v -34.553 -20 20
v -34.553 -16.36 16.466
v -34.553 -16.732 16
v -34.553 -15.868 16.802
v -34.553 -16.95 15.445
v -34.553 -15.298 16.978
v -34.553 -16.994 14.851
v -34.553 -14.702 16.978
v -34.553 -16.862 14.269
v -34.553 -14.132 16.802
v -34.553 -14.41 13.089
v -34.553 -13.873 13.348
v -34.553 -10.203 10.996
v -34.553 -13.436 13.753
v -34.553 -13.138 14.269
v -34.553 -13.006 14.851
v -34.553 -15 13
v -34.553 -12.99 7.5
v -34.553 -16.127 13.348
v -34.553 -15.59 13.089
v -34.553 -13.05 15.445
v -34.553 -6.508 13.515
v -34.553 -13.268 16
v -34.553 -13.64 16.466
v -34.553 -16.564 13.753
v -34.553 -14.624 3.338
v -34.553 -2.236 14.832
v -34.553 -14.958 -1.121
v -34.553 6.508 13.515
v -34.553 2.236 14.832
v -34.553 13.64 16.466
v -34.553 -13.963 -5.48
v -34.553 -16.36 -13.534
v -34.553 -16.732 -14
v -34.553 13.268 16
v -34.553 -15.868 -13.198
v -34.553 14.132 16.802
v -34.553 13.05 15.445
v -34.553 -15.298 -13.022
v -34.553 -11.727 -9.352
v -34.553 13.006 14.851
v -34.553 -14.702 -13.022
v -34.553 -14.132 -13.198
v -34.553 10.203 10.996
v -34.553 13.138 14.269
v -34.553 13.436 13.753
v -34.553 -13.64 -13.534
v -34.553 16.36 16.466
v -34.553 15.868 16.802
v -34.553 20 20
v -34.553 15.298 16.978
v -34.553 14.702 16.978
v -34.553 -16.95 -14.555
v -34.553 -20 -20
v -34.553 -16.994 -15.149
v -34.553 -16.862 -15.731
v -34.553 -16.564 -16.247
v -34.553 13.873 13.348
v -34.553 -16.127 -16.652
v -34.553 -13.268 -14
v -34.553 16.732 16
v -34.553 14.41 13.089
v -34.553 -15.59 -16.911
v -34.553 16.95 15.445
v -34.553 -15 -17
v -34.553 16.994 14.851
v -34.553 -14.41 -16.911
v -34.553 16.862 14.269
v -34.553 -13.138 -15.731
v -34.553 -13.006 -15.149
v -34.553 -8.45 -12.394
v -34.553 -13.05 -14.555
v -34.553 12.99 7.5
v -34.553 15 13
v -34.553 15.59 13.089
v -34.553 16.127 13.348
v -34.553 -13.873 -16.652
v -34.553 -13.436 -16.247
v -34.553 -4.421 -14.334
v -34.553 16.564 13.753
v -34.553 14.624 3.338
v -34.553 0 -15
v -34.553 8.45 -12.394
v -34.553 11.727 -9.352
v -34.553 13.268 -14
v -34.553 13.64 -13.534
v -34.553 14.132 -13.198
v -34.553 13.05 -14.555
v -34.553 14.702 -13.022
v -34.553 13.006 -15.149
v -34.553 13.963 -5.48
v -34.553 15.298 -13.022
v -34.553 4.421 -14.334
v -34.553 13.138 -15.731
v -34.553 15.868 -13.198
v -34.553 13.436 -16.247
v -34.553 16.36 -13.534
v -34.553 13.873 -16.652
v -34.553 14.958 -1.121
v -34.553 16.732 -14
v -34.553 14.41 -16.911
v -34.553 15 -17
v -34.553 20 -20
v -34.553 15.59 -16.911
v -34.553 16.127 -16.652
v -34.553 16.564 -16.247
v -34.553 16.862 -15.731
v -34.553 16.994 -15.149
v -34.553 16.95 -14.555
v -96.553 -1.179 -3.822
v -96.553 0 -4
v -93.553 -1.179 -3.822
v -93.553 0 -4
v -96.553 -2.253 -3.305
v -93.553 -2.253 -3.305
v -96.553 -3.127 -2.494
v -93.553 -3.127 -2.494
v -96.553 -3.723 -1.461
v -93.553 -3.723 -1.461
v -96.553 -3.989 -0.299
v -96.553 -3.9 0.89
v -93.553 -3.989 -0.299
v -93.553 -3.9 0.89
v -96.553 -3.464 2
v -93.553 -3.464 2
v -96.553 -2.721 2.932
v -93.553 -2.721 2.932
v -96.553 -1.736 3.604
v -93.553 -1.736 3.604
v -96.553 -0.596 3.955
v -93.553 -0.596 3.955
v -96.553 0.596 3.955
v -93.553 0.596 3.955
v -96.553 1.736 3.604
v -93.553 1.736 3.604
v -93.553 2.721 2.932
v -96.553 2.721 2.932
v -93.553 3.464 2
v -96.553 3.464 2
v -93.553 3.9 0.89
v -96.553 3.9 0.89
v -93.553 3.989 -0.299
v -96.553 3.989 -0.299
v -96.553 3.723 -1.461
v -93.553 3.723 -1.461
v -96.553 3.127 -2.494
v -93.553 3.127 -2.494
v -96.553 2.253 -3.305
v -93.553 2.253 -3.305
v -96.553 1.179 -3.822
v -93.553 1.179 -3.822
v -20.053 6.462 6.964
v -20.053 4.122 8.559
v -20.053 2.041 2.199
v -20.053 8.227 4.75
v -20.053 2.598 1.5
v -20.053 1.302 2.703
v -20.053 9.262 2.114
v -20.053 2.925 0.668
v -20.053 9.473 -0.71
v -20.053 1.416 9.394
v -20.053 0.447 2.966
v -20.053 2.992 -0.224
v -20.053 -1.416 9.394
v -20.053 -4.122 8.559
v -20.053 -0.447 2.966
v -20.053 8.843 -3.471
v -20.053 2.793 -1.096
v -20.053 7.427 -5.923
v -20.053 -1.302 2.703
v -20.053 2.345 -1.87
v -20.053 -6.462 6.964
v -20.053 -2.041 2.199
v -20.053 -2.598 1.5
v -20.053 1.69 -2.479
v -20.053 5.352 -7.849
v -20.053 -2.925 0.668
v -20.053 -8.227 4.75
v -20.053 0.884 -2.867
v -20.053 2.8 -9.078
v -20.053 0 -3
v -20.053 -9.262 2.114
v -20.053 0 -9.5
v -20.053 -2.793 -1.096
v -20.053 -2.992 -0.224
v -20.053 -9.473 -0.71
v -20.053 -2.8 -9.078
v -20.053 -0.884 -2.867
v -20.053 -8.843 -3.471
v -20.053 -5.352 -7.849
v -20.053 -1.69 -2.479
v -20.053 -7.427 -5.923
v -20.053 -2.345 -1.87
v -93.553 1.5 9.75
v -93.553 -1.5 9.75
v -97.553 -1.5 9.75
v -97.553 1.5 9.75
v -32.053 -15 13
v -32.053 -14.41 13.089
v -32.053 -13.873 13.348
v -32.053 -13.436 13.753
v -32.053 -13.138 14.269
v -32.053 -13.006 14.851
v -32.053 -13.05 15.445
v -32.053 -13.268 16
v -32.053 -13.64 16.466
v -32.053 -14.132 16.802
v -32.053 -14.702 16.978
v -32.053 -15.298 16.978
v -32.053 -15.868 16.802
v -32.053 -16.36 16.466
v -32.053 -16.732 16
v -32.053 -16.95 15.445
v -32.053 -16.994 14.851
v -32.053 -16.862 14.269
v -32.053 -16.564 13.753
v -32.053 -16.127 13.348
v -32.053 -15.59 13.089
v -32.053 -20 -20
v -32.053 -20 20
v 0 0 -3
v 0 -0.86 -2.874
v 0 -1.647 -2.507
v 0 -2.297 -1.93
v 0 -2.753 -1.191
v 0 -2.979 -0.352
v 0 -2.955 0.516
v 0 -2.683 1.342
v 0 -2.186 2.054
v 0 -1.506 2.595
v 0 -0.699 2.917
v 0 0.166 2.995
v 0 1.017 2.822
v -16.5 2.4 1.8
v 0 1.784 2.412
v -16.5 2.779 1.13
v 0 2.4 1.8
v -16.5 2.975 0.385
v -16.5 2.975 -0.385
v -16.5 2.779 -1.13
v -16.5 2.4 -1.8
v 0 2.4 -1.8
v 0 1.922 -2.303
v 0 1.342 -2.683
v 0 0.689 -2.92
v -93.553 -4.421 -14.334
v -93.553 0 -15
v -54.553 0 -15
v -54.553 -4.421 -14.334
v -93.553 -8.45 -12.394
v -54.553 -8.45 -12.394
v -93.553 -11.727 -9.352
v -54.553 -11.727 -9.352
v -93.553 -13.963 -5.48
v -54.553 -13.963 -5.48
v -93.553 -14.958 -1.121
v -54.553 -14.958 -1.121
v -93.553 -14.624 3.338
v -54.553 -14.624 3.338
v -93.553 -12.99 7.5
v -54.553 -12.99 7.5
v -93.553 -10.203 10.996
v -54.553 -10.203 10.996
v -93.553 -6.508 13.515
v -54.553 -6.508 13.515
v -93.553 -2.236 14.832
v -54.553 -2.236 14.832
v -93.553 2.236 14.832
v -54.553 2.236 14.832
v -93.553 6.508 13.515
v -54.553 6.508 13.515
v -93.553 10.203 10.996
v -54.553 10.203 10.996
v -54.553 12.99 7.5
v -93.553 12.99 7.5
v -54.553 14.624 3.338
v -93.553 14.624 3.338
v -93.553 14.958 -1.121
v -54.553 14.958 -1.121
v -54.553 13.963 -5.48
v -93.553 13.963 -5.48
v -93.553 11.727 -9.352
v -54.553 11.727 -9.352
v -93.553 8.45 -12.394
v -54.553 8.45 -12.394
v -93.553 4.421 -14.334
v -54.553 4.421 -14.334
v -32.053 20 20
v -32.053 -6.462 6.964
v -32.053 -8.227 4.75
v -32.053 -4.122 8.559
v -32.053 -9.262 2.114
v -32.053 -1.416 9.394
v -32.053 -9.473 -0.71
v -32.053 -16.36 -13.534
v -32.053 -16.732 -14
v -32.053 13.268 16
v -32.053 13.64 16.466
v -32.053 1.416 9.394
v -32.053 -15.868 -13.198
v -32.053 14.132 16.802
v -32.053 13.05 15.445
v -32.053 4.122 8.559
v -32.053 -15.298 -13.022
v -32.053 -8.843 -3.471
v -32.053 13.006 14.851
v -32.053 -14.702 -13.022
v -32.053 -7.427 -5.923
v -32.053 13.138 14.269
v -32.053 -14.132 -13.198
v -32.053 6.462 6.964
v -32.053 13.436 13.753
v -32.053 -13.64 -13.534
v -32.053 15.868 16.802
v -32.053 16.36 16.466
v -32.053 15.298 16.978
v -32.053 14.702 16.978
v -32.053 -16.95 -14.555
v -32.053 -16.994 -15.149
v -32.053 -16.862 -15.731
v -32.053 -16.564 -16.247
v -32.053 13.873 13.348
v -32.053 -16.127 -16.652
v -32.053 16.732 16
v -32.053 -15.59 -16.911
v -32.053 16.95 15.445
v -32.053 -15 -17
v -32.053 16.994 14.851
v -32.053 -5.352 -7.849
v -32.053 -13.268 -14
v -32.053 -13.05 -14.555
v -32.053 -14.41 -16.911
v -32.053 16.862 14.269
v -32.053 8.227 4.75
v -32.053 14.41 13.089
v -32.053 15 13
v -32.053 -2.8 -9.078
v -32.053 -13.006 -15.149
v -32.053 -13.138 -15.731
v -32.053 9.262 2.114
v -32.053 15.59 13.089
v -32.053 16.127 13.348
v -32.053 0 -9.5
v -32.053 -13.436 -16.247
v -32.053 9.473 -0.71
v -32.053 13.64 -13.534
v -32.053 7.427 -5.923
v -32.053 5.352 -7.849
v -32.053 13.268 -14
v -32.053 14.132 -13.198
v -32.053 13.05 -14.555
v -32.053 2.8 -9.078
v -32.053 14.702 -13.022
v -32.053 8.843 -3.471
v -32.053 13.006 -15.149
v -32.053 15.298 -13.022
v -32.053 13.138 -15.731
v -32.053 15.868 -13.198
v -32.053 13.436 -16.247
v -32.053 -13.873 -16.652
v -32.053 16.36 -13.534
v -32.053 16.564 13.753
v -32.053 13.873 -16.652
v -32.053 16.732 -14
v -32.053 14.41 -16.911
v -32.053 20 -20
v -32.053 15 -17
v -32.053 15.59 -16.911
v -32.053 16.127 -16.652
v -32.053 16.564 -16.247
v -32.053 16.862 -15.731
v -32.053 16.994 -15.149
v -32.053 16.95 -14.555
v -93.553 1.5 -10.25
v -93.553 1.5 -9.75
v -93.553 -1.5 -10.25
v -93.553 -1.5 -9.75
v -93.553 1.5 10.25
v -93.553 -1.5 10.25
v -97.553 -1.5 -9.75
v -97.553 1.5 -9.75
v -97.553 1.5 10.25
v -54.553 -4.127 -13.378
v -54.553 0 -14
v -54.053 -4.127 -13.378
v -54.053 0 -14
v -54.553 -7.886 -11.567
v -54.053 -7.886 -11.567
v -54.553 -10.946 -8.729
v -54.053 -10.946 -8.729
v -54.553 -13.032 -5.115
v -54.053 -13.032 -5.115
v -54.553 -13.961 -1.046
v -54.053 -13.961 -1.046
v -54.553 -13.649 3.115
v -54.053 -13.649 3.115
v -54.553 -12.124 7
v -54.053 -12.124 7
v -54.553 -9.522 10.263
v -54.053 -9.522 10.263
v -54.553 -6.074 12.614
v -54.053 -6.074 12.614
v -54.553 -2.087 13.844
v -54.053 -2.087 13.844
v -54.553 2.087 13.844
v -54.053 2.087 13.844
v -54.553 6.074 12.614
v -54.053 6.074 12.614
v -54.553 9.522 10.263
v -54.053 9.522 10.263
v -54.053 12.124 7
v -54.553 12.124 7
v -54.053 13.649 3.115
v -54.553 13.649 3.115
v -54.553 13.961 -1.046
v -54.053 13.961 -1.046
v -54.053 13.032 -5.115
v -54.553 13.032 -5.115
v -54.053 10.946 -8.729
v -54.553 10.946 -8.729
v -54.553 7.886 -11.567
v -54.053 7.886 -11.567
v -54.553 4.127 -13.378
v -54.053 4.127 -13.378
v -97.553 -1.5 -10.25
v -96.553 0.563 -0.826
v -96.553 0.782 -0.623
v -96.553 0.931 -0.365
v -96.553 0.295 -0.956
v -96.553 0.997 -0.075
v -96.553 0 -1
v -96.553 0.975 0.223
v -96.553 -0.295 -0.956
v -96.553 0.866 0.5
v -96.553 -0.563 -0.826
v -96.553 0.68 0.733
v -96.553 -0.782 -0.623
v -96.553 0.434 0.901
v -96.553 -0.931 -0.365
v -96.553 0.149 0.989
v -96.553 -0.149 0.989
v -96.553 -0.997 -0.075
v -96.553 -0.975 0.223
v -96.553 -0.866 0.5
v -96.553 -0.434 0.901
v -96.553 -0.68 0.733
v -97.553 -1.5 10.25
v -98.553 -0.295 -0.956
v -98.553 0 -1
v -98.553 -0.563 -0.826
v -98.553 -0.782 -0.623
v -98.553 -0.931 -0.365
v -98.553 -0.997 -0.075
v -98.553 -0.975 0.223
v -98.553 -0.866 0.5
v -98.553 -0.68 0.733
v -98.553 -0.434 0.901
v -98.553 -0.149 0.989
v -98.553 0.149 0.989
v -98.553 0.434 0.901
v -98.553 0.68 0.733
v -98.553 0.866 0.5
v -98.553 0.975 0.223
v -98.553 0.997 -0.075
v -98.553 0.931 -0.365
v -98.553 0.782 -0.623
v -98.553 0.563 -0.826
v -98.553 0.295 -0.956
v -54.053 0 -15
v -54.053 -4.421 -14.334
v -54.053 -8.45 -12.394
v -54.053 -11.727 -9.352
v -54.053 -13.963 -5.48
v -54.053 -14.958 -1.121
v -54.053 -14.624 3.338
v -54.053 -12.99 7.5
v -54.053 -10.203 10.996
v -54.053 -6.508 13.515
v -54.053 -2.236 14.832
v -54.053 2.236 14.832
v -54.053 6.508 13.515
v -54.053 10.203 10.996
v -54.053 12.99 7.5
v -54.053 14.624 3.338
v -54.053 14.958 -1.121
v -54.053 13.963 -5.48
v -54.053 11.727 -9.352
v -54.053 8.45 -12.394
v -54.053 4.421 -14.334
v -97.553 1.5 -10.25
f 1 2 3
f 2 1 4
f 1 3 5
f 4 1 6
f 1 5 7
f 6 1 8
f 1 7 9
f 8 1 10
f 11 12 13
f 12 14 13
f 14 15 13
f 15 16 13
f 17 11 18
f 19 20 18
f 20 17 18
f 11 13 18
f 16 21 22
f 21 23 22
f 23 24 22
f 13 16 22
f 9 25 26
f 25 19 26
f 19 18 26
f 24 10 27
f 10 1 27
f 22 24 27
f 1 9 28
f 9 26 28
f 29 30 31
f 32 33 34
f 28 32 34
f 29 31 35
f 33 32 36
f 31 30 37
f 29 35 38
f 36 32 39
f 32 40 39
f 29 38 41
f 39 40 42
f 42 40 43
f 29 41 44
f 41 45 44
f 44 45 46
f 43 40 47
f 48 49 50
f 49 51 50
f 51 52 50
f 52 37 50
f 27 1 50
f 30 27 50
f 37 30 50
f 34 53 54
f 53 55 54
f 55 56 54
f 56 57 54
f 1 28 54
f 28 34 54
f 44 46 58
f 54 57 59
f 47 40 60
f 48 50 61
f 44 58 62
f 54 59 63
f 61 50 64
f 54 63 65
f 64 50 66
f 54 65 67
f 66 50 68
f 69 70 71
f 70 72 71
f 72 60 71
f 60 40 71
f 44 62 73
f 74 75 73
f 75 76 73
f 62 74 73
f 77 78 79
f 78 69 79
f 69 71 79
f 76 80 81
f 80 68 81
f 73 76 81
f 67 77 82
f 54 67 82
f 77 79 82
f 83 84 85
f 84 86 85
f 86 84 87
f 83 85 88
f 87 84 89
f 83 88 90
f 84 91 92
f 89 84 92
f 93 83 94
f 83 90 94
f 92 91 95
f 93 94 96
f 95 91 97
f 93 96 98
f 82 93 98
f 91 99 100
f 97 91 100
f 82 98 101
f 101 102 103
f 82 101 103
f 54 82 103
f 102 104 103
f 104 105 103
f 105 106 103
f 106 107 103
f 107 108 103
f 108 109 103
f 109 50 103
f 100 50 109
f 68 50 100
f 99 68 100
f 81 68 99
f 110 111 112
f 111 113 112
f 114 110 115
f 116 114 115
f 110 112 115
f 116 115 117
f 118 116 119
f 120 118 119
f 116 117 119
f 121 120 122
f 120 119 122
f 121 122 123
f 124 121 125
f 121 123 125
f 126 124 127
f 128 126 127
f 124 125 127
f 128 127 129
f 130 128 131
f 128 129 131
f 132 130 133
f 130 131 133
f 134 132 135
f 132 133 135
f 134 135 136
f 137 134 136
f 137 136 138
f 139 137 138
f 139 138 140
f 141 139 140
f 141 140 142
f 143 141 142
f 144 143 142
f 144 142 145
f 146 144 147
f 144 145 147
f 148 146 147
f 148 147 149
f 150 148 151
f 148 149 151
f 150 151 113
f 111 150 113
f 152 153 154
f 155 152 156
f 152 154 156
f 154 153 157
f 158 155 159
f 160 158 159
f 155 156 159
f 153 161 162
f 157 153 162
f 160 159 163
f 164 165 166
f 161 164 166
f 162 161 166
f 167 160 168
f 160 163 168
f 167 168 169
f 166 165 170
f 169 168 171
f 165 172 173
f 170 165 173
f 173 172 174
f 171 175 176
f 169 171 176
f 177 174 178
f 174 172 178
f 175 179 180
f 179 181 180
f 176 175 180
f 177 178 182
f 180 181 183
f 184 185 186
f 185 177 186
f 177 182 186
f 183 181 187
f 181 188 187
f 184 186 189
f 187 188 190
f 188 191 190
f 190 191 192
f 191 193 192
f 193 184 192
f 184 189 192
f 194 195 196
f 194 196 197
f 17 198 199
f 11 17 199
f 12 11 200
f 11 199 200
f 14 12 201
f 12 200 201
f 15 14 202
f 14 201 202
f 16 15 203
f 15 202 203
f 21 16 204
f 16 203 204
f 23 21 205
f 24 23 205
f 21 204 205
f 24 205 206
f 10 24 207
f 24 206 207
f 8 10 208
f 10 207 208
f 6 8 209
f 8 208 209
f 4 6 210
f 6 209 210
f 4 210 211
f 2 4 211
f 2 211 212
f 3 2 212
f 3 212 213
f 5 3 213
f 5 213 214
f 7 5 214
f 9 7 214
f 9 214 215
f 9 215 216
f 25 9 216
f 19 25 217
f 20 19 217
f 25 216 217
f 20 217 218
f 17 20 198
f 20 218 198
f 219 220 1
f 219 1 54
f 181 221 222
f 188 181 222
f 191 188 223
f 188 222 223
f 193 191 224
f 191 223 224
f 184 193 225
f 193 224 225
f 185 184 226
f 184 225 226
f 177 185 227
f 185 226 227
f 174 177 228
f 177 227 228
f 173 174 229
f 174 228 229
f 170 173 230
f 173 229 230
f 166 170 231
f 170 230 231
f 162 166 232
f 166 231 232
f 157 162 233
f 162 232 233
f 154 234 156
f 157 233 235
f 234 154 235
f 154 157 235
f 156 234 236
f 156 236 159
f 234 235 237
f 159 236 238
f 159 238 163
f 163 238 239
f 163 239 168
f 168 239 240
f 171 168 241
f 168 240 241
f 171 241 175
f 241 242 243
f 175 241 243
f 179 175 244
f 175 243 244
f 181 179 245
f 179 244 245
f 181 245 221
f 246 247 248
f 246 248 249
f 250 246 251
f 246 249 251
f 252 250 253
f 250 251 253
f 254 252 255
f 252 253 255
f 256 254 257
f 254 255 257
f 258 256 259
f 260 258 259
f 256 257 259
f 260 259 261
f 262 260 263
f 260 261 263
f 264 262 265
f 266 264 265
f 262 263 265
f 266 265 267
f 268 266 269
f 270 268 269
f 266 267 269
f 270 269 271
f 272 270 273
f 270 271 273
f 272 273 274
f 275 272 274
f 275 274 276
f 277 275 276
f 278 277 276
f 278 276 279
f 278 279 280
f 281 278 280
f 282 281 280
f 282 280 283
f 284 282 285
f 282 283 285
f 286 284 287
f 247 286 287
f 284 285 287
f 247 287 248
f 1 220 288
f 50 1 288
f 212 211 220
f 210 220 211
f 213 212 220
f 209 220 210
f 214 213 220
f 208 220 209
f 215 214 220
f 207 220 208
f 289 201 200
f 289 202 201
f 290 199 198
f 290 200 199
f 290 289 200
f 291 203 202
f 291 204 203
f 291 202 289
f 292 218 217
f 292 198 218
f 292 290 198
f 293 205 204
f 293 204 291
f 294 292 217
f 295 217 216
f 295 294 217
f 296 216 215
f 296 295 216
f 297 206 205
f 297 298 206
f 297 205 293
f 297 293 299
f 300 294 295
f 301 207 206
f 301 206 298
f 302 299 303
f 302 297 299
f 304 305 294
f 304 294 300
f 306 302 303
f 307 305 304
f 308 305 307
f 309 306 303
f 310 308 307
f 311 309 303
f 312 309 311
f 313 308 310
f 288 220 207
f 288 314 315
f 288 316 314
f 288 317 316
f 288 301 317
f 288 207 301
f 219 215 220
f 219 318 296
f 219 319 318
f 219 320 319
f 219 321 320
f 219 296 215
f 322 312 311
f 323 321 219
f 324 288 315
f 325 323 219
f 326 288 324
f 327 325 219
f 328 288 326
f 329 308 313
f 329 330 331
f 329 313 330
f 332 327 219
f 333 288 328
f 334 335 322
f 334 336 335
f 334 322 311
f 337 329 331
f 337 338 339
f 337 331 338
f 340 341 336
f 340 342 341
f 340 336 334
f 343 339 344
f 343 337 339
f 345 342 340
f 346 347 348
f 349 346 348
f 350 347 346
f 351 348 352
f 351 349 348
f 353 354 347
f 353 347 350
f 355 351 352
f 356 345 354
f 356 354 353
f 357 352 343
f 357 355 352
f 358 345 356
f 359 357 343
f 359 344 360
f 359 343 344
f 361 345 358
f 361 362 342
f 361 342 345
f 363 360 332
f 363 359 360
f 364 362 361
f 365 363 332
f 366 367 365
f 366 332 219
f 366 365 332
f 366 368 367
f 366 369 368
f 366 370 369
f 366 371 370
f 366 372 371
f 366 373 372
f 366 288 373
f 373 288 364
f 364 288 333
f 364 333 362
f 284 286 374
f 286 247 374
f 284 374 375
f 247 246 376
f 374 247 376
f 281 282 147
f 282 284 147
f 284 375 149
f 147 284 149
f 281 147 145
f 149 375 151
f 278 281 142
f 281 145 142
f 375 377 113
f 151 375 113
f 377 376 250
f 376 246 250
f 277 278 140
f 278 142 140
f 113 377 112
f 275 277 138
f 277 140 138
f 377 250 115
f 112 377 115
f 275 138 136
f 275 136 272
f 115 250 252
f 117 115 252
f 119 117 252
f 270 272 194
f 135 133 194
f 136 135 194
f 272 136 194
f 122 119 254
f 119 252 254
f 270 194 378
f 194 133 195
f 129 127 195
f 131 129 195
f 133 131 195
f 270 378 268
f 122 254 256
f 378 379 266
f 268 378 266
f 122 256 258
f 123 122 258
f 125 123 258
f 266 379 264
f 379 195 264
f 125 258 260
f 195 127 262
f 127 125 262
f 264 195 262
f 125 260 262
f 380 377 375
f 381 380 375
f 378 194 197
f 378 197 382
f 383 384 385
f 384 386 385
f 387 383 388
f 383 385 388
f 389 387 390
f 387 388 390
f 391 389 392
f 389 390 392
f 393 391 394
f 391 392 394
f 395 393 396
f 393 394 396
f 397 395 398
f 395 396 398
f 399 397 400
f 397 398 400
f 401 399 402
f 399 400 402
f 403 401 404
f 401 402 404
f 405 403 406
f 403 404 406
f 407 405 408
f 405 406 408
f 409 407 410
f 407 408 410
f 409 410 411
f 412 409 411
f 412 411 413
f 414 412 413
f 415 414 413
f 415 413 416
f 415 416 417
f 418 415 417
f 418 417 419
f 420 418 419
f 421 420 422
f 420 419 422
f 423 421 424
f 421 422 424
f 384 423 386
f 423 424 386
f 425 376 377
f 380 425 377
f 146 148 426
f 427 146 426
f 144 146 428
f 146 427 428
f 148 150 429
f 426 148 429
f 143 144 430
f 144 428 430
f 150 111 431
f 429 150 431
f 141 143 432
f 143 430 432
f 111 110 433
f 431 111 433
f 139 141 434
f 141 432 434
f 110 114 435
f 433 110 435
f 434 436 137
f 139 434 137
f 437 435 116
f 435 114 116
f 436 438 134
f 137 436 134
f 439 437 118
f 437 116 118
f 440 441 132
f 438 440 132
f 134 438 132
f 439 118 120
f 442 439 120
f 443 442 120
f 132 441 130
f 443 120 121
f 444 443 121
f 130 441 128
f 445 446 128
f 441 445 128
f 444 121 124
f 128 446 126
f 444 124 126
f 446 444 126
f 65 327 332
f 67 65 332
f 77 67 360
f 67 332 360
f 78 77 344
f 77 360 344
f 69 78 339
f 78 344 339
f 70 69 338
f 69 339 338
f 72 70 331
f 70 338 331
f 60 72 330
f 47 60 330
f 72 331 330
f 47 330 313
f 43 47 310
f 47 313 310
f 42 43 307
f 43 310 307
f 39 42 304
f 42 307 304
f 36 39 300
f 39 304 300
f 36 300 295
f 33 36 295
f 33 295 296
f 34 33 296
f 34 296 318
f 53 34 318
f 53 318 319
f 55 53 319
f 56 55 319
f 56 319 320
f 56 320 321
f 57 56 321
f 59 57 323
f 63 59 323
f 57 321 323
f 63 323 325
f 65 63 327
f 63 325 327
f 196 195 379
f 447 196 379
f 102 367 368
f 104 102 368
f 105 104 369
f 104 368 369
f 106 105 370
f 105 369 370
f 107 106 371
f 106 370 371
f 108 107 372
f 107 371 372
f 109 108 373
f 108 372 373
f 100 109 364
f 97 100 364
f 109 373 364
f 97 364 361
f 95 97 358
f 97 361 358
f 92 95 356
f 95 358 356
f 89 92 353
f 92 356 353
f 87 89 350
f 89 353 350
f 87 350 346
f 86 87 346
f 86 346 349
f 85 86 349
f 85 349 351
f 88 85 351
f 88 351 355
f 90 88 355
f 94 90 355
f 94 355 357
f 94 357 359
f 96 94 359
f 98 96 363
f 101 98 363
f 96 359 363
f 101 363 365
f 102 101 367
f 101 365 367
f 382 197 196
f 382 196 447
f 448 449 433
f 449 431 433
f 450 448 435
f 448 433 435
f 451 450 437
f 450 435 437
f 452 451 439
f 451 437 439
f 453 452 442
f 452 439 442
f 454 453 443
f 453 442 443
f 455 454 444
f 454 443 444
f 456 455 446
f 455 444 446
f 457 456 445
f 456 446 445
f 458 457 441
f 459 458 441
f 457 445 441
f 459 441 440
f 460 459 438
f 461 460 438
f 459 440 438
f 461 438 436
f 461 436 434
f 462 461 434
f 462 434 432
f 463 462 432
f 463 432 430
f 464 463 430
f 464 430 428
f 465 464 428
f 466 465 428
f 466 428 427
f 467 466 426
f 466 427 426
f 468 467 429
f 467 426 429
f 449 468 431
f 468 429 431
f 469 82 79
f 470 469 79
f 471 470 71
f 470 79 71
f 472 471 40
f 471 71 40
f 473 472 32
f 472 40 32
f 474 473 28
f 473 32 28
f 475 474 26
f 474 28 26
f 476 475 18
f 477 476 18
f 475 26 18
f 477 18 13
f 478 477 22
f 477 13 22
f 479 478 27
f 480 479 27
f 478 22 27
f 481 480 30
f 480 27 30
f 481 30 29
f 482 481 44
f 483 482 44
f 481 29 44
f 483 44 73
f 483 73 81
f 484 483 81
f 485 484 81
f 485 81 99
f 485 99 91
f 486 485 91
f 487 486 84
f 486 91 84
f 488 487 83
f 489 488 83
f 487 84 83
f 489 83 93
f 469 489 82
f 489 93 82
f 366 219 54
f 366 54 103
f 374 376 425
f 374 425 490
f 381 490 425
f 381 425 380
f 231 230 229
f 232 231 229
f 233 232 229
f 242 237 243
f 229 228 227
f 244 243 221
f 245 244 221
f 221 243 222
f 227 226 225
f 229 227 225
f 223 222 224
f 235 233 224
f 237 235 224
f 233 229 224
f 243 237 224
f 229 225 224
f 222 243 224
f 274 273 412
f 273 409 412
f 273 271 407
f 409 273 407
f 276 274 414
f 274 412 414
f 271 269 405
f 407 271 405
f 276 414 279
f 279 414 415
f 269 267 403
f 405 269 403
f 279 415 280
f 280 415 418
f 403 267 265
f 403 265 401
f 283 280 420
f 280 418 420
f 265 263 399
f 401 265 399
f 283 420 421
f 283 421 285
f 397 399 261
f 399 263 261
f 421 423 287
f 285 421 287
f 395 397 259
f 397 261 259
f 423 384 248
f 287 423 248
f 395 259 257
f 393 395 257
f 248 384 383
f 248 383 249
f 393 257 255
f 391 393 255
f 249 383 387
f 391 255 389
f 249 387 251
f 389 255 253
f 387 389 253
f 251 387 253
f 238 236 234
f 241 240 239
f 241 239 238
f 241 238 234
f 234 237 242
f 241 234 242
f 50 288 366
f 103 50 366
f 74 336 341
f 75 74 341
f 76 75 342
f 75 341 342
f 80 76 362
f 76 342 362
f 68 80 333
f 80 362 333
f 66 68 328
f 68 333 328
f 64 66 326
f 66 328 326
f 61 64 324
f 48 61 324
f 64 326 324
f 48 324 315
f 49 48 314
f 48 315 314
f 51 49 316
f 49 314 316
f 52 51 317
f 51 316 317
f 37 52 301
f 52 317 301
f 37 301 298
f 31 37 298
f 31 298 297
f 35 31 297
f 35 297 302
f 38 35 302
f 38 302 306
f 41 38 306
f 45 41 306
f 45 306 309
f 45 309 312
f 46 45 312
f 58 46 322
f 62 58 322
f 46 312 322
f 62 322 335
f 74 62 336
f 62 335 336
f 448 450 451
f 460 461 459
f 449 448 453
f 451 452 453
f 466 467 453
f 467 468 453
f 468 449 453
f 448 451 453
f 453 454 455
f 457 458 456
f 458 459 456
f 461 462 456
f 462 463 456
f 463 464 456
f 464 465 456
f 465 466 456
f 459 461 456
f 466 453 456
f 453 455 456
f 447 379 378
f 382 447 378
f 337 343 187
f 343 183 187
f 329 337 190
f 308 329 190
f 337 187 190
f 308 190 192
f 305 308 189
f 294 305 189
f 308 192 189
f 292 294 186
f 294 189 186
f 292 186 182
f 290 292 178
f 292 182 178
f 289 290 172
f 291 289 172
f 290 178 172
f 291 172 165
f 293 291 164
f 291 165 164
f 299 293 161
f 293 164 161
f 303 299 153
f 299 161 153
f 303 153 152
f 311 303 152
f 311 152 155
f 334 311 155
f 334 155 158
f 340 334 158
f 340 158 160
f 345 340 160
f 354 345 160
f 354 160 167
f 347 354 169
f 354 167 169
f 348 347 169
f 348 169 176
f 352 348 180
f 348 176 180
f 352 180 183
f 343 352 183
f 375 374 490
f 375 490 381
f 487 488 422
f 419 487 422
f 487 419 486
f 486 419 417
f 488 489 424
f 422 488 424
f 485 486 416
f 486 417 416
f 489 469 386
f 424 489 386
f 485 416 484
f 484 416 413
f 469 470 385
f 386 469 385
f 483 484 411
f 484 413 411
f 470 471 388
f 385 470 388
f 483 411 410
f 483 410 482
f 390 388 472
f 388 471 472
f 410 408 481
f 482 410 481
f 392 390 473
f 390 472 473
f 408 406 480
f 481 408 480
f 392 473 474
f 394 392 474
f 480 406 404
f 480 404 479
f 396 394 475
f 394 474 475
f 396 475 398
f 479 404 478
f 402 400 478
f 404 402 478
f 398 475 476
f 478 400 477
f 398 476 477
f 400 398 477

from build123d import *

# Parameters (mm, degrees)
CROQUIS2_W              = 40
CROQUIS2_H              = 40
SALIENTE_EXTRUIR1_DEPTH = 2.5
CROQUIS3_R              = 2
CORTAR_EXTRUIR1_DEPTH   = 2.5
CORTAR_EXTRUIR2_DEPTH   = 16.5
CROQUIS7_W              = 0.5
CROQUIS7_H              = 3
SALIENTE_EXTRUIR2_DEPTH = 4


with BuildPart() as part:
    # Croquis1 → Revolución1 (revolve)
    with BuildSketch(Plane.XY, mode=Mode.PRIVATE) as revoluci_n1_sk:
        Polygon((0, 0), (-93.552786405, 0), (-98.552786405, 0), (-98.552786405, 1), (-96.552786405, 1), (-96.552786405, 4), (-93.552786405, 4), (-93.552786405, 15), (-54.552786405, 15), (-54.552786405, 14), (-54.052786405, 14), (-54.052786405, 15), (-32.052786405, 15), (-32.052786405, 9.5), (-20.052786405, 9.5), (-20.052786405, 3), (0, 3), align=None)
    revolve(revoluci_n1_sk.sketch.rotate(Axis((0, 0, 0), (-1, 0, 0)), 90), axis=Axis((0, 0, 0), (-1, 0, 0)))

    # Croquis2 → Saliente-Extruir1 (add)
    with BuildSketch(Plane(origin=(-32.052786405, 0, 0), x_dir=(0, 0, -1), z_dir=(1, 0, 0))):
        Rectangle(CROQUIS2_W, CROQUIS2_H)
    extrude(amount=-SALIENTE_EXTRUIR1_DEPTH)

    # Croquis3 → Cortar-Extruir1 (cut)
    with BuildSketch(Plane(origin=(-32.052786405, 0, 0), x_dir=(0, 0, -1), z_dir=(1, 0, 0))):
        with Locations((-15, 15)):
            Circle(CROQUIS3_R)
        with Locations((15, 15)):
            Circle(CROQUIS3_R)
        with Locations((-15, -15)):
            Circle(CROQUIS3_R)
        with Locations((15, -15)):
            Circle(CROQUIS3_R)
    extrude(amount=-CORTAR_EXTRUIR1_DEPTH, mode=Mode.SUBTRACT)

    # Croquis6 → Cortar-Extruir2 (cut)
    with BuildSketch(Plane(origin=(0, 0, 0), x_dir=(0, 0, -1), z_dir=(1, 0, 0))):
        with BuildLine():
            Line((-1.8, 2.4), (0, 2.4))
            Line((0, 2.4), (1.8, 2.4))
            ThreePointArc((1.8, 2.4), (0, 3), (-1.8, 2.4))
        make_face()
    extrude(amount=-CORTAR_EXTRUIR2_DEPTH, mode=Mode.SUBTRACT)

    # Croquis7 → Saliente-Extruir2 (add)
    with BuildSketch(Plane.ZY.offset(93.552786405)):
        with Locations((-10, 0)):
            Rectangle(CROQUIS7_W, CROQUIS7_H)
        with Locations((10, 0)):
            Rectangle(CROQUIS7_W, CROQUIS7_H)
    extrude(amount=SALIENTE_EXTRUIR2_DEPTH)


solid = part.part
